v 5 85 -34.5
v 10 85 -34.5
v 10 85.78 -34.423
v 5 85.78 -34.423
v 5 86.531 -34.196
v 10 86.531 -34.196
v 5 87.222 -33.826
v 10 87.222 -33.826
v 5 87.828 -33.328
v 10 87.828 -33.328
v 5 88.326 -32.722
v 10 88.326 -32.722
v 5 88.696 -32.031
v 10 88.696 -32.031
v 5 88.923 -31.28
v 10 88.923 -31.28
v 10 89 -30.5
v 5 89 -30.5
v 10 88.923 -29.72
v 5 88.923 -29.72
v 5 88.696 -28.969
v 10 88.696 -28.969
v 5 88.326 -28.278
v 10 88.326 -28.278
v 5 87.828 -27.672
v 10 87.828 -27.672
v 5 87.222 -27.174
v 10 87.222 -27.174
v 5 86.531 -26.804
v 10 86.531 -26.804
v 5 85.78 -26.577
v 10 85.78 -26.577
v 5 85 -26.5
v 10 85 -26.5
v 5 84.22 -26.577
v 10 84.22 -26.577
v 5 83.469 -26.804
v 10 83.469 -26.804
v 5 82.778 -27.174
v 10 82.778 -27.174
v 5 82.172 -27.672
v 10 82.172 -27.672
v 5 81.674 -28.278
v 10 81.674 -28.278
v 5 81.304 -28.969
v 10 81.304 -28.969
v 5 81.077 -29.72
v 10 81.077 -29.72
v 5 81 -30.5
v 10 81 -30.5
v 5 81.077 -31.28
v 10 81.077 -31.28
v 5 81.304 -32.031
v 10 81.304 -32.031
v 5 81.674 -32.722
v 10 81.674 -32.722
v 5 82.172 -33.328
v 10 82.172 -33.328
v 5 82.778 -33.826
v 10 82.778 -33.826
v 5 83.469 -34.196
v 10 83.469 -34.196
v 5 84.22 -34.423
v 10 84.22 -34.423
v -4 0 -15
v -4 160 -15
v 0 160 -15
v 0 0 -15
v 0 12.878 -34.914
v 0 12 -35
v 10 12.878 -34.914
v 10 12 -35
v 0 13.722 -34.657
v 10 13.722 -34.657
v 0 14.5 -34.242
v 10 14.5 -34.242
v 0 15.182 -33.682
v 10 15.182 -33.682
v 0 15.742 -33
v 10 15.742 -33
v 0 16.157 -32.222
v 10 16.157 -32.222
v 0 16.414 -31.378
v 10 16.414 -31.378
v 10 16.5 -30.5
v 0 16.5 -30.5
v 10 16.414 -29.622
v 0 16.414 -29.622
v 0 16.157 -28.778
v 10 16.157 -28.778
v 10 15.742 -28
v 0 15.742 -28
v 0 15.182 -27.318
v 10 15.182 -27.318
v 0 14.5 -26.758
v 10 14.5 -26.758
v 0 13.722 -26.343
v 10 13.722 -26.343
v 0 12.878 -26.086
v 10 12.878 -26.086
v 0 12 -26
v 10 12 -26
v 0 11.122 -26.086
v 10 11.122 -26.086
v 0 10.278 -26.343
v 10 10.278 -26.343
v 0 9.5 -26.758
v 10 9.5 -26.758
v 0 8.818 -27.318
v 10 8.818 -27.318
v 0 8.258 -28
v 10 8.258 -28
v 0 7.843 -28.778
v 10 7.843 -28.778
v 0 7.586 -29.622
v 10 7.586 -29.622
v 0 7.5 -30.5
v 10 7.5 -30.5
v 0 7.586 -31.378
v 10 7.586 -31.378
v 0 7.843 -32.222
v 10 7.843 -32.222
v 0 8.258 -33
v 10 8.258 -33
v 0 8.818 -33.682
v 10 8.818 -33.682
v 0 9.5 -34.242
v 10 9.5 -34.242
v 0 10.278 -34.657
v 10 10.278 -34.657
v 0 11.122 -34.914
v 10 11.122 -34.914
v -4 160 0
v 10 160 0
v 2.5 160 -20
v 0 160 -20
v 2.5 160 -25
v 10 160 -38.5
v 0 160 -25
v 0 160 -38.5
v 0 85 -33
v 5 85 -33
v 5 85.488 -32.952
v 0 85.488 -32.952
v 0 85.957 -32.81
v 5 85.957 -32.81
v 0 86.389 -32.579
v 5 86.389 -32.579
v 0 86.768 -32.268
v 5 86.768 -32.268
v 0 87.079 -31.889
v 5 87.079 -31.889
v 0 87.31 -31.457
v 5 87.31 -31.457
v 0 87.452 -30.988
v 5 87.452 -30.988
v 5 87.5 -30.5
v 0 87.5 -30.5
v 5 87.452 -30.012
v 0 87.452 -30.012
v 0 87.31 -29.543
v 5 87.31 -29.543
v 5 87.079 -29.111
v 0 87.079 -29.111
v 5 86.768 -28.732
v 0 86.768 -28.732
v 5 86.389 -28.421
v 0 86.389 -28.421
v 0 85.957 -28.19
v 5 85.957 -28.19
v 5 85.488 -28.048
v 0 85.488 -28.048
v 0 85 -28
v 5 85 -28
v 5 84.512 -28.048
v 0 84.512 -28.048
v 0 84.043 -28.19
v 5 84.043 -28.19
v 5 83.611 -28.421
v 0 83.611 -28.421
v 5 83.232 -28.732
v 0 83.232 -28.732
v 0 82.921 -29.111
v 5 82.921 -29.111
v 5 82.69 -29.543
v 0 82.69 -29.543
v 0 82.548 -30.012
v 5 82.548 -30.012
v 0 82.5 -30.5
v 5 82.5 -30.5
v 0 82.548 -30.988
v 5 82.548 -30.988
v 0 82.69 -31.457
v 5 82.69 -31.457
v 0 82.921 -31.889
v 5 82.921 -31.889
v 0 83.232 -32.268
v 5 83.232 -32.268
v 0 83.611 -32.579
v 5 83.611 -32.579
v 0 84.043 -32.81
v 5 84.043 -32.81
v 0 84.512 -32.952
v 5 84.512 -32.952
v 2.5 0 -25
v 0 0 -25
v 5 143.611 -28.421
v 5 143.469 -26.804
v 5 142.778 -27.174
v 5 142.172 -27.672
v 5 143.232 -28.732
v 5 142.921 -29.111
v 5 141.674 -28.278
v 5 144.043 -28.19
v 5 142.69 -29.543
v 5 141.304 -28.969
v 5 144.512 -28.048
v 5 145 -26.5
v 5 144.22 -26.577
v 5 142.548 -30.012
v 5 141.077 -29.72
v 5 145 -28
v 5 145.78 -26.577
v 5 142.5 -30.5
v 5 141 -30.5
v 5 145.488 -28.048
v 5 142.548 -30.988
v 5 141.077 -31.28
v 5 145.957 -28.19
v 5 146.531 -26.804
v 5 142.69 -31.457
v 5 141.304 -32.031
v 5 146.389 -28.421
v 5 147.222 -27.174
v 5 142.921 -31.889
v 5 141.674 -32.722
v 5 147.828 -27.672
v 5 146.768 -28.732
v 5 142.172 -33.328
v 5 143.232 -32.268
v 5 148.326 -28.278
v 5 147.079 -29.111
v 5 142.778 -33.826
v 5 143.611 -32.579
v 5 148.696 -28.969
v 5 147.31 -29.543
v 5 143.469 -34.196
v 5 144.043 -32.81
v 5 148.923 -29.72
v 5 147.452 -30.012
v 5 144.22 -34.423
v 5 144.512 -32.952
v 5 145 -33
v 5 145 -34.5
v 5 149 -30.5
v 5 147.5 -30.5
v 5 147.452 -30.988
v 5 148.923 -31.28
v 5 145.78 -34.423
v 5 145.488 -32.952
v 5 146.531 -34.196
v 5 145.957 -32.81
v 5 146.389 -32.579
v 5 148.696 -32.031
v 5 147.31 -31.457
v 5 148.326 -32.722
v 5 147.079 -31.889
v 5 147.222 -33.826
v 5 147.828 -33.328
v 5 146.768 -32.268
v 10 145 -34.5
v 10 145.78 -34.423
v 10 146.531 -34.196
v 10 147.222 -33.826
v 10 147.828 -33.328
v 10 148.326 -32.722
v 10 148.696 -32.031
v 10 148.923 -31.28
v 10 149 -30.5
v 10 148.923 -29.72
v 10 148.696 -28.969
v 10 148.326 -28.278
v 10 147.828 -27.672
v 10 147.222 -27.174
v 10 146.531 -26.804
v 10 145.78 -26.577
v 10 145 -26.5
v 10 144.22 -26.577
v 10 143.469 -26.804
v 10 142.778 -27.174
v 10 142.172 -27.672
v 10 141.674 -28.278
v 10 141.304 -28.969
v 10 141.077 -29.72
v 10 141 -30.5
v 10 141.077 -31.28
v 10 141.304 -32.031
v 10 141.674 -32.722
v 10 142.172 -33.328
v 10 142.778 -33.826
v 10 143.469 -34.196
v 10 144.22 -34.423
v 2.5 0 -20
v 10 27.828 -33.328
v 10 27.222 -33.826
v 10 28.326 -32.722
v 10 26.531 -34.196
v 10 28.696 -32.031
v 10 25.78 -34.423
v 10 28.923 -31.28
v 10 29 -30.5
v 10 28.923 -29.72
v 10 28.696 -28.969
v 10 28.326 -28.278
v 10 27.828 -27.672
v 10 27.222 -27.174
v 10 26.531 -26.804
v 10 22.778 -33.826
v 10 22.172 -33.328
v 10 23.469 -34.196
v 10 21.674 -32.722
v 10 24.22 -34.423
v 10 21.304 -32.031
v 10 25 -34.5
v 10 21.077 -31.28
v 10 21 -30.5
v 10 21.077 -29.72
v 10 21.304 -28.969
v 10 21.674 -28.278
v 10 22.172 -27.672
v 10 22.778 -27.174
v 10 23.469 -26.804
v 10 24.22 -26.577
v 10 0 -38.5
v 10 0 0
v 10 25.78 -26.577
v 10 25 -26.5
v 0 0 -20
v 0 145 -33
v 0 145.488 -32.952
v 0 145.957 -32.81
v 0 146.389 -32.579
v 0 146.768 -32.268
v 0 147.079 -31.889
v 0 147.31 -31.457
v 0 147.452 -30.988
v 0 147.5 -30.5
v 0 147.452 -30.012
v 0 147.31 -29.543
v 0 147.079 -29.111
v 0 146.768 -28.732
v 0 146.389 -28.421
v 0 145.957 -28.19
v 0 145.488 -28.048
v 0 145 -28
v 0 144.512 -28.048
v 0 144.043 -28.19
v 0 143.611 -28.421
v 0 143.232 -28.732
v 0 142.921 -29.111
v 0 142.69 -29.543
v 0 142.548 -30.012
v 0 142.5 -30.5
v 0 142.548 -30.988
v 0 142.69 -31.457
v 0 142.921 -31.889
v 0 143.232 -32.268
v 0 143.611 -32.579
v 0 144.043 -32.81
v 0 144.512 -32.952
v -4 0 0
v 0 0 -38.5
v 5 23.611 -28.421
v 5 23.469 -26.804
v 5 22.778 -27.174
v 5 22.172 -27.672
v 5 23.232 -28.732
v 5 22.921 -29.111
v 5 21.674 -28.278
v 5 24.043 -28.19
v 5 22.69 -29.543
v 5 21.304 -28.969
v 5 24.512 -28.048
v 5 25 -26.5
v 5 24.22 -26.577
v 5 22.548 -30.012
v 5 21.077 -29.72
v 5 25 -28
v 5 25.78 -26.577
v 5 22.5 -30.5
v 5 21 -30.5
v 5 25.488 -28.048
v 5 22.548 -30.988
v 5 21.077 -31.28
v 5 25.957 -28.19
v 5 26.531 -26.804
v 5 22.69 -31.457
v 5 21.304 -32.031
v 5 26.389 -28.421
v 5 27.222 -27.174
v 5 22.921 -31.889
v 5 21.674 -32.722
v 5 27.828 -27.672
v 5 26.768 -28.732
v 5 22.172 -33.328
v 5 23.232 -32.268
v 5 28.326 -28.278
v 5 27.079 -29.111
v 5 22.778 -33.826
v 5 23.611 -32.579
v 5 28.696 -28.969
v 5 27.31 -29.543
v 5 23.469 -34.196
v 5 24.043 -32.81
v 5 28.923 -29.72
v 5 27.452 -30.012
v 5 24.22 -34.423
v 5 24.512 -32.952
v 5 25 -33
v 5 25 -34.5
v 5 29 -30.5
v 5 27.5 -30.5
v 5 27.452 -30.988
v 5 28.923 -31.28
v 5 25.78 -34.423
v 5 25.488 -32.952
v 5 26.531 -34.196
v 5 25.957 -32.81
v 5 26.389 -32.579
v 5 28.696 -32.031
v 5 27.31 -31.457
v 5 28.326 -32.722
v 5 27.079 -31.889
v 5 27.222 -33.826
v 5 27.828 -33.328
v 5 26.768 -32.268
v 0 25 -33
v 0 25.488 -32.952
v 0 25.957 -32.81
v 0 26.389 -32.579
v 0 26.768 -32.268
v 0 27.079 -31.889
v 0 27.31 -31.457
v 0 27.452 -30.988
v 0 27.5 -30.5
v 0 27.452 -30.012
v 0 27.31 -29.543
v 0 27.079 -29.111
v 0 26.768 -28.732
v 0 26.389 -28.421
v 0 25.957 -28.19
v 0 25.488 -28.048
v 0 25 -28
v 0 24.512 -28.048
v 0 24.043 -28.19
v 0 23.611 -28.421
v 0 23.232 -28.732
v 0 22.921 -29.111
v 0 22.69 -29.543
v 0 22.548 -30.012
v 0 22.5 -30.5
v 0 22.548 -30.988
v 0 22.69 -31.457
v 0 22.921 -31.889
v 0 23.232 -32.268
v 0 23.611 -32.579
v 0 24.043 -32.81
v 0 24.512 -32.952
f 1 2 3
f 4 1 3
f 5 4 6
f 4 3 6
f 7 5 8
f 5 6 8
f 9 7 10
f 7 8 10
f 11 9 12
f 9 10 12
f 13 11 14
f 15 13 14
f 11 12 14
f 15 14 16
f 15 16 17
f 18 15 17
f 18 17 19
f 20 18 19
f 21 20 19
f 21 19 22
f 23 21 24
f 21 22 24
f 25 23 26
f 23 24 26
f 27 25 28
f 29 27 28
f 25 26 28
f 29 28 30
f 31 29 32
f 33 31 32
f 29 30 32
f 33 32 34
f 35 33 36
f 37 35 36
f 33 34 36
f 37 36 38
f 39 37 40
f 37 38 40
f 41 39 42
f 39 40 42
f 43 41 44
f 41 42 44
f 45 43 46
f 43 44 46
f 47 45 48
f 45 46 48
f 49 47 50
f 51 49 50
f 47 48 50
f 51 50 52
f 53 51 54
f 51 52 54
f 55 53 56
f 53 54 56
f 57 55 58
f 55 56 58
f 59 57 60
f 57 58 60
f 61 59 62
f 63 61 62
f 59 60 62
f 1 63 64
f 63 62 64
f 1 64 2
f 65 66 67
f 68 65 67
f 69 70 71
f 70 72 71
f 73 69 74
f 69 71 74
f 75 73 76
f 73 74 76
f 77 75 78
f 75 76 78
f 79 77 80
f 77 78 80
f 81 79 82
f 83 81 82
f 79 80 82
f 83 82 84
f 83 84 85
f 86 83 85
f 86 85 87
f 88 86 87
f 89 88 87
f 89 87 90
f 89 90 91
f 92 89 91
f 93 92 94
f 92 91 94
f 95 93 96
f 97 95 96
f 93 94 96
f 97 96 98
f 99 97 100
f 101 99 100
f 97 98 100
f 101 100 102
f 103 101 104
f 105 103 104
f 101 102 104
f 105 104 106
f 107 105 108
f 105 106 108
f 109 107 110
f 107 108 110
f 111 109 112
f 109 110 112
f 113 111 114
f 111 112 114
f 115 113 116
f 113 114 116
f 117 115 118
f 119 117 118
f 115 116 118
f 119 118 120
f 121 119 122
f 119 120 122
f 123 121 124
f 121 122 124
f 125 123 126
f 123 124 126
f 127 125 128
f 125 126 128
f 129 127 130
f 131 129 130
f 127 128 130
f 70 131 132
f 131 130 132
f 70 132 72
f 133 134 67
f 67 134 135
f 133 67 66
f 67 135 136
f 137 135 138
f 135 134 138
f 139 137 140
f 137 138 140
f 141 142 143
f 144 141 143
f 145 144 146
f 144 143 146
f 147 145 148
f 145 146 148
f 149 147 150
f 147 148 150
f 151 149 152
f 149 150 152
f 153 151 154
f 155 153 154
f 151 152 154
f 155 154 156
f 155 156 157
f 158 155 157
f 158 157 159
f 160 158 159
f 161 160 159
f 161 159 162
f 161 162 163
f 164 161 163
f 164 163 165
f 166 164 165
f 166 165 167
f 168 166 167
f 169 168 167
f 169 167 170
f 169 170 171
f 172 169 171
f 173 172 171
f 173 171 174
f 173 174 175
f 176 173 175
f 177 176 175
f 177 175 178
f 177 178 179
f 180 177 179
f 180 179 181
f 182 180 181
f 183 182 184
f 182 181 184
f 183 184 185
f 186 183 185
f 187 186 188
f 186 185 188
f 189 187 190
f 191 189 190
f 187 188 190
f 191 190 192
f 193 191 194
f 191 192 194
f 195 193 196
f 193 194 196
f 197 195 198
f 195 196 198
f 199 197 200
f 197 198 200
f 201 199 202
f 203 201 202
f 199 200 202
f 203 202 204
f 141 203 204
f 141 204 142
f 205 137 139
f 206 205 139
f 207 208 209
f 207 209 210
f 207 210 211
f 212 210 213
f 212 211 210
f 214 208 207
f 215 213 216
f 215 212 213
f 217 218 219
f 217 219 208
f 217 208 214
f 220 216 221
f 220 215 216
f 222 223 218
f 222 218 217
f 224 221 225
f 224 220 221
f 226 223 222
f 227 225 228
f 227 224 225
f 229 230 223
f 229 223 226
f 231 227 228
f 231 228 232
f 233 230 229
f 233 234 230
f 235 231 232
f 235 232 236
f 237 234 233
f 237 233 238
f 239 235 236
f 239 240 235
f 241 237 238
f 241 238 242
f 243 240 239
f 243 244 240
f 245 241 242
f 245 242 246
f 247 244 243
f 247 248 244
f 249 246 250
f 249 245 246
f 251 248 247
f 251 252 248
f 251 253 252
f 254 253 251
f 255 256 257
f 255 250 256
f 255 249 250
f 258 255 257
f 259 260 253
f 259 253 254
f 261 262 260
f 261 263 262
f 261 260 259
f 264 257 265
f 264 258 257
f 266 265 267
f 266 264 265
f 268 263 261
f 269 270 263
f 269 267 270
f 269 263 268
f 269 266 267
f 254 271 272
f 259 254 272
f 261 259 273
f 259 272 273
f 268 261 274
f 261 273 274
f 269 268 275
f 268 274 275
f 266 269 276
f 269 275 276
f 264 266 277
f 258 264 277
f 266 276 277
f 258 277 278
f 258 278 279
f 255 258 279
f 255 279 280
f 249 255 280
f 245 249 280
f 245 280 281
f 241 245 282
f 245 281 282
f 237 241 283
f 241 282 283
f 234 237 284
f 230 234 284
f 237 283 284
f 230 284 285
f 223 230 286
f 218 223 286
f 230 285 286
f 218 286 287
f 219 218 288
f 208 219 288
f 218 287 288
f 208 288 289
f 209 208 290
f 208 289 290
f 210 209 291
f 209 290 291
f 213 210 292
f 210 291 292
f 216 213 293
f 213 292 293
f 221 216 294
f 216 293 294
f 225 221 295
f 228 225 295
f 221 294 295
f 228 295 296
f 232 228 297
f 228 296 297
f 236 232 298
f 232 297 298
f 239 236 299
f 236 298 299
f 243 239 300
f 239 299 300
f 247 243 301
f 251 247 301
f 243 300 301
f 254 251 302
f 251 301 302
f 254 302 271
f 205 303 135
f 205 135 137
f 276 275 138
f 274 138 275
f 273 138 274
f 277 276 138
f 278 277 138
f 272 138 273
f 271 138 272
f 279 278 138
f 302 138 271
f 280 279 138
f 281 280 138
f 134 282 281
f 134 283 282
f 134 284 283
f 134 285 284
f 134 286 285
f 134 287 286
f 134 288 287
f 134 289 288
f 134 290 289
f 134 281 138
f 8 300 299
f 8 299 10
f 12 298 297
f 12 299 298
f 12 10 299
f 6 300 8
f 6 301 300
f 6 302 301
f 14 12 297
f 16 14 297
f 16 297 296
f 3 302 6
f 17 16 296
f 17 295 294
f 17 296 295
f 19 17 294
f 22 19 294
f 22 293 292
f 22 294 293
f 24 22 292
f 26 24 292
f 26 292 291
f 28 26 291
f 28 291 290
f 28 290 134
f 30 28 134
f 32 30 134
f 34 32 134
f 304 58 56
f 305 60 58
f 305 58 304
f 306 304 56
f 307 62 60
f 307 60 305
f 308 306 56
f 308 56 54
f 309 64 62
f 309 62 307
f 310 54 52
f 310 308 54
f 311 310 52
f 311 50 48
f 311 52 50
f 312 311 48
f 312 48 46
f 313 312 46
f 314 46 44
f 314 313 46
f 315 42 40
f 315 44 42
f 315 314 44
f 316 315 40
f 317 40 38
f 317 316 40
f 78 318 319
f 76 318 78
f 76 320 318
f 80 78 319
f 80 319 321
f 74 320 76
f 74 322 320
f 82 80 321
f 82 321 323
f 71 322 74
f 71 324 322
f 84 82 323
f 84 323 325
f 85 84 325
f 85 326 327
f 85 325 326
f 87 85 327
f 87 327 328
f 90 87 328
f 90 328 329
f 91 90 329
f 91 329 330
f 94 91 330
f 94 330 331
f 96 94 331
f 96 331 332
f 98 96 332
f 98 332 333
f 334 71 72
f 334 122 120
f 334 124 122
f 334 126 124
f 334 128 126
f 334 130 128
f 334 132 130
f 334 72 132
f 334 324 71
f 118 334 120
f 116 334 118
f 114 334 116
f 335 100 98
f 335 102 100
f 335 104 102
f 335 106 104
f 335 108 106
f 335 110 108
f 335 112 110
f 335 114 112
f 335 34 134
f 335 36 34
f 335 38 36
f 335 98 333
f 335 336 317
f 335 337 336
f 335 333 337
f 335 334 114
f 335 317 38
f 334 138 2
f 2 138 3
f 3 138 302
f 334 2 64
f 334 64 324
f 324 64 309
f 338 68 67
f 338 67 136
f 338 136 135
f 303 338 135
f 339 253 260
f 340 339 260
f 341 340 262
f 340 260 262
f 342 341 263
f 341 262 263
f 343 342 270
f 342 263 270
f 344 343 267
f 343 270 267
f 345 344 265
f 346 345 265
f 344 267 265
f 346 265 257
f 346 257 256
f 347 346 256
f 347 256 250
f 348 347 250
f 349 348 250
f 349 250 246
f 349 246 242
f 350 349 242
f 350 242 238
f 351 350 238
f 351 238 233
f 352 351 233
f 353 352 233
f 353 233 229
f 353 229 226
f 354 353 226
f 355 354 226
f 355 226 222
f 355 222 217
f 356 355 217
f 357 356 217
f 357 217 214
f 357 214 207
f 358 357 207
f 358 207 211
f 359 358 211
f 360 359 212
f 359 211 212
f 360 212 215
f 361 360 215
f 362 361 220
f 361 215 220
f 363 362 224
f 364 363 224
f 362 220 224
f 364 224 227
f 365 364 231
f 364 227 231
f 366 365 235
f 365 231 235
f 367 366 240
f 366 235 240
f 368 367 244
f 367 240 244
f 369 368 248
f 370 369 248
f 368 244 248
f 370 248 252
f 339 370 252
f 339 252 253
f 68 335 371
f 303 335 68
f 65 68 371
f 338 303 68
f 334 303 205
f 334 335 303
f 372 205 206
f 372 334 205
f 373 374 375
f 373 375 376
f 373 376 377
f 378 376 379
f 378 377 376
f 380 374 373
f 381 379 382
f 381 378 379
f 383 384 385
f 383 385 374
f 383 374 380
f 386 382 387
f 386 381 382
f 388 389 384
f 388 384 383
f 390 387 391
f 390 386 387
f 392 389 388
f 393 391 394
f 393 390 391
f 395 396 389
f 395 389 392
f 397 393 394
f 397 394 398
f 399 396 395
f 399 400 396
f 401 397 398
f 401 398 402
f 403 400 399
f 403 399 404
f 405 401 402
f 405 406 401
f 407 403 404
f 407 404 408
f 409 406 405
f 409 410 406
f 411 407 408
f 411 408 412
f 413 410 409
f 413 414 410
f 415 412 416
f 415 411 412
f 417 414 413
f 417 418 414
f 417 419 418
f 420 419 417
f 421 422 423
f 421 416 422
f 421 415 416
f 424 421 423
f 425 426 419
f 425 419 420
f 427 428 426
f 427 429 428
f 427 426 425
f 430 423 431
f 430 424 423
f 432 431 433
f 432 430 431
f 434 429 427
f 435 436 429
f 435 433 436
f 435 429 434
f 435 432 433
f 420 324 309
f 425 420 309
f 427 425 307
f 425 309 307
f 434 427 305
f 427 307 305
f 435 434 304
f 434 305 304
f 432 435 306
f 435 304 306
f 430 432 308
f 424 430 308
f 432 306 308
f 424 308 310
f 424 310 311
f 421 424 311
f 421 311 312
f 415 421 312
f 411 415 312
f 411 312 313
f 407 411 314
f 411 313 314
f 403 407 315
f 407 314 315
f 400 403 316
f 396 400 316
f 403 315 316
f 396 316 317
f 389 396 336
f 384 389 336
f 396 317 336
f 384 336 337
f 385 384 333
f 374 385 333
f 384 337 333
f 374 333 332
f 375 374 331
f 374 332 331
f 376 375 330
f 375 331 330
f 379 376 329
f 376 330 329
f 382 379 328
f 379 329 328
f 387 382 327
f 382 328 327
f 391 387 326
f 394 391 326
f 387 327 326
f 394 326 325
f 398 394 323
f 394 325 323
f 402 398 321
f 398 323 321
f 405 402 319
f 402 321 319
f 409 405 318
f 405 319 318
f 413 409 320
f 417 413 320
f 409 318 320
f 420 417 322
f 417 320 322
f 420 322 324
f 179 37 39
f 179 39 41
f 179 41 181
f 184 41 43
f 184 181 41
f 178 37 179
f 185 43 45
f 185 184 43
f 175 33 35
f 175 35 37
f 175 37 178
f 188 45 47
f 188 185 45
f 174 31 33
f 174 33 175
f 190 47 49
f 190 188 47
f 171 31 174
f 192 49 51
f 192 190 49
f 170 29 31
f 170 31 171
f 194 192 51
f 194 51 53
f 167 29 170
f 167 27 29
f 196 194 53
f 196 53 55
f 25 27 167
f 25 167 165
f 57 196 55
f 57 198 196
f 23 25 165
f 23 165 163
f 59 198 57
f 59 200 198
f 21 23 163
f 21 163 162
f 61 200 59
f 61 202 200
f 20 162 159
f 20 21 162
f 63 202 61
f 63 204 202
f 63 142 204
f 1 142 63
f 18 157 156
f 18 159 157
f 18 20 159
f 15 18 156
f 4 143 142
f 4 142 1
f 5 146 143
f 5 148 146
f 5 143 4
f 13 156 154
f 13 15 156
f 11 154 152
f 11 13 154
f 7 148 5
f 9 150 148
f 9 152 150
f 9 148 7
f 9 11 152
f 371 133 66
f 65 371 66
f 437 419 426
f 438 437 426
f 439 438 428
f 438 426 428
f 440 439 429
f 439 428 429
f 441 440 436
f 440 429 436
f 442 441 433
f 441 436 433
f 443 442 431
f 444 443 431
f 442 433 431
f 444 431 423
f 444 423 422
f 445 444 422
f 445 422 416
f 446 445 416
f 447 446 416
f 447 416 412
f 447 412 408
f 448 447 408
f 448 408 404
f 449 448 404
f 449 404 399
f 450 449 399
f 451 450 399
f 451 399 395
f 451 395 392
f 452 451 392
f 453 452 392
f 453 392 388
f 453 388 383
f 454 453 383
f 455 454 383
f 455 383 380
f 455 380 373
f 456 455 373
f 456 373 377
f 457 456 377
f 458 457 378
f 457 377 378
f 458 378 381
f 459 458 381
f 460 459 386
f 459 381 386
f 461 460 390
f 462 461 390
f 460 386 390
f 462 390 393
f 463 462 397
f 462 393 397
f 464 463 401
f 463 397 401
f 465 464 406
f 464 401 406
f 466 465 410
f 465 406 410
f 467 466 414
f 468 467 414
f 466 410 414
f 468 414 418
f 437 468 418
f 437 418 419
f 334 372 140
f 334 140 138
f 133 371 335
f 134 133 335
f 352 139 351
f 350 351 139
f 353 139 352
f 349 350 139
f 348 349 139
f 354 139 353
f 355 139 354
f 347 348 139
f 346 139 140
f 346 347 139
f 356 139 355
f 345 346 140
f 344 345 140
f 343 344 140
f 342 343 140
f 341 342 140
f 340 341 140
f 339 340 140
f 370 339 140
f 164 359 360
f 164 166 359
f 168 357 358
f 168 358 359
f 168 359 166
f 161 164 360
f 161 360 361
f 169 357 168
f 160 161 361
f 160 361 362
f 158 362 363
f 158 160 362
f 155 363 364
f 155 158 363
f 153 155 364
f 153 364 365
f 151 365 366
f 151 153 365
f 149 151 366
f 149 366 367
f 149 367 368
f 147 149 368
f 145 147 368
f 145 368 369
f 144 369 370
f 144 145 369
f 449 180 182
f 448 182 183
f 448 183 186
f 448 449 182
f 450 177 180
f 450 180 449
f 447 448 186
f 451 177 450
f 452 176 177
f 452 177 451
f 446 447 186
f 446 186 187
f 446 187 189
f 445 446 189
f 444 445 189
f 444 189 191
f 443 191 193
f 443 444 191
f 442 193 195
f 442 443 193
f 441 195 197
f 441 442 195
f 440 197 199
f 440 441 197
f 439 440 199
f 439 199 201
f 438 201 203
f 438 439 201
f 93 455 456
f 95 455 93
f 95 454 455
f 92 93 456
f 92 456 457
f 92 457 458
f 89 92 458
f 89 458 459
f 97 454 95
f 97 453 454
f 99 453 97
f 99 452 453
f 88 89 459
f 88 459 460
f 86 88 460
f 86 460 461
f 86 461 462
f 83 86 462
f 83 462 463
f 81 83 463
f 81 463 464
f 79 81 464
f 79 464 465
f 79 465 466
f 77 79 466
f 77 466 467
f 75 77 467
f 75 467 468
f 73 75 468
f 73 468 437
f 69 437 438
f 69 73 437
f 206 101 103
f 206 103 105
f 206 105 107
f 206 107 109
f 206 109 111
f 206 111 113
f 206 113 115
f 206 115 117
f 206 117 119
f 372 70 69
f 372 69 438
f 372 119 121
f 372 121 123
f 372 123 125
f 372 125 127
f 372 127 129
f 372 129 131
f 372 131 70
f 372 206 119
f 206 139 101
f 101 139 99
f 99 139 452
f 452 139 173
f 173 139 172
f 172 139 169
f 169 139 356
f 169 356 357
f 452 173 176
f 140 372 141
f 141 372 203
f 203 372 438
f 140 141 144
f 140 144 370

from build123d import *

# Parameters (mm, degrees)
BOSS_EXTRUDE1_DEPTH = 160
SKETCH2_R           = 4
SKETCH2_R_2         = 4.5
CUT_EXTRUDE2_DEPTH  = 5
SKETCH3_R           = 2.5
SKETCH3_R_2         = 4.5
CUT_EXTRUDE3_DEPTH  = 10


with BuildPart() as part:
    # Sketch1 → Boss-Extrude1 (new body)
    with BuildSketch(Plane(origin=(0, 0, 0), x_dir=(1, 0, 0), z_dir=(0, 1, 0))):
        Polygon((0, 20), (2.5, 20), (2.5, 25), (0, 25), (0, 38.5), (10, 38.5), (10, 0), (0, 0), (-4, 0), (-4, 15), (0, 15), align=None)
    extrude(amount=BOSS_EXTRUDE1_DEPTH)

    # Sketch2 → Cut-Extrude2 (cut)
    with BuildSketch(Plane(origin=(10, 0, 0), x_dir=(0, 0, -1), z_dir=(1, 0, 0))):
        with Locations((30.5, 145)):
            Circle(SKETCH2_R)
        with Locations((30.5, 85)):
            Circle(SKETCH2_R)
        with Locations((30.5, 25)):
            Circle(SKETCH2_R)
        with Locations((30.5, 12)):
            Circle(SKETCH2_R_2)
    extrude(amount=-CUT_EXTRUDE2_DEPTH, mode=Mode.SUBTRACT)

    # Sketch3 → Cut-Extrude3 (cut, through all)
    with BuildSketch(Plane(origin=(5, 0, 0), x_dir=(0, 0, -1), z_dir=(1, 0, 0))):
        with Locations((30.5, 145)):
            Circle(SKETCH3_R)
        with Locations((30.5, 85)):
            Circle(SKETCH3_R)
        with Locations((30.5, 25)):
            Circle(SKETCH3_R)
        with Locations((30.5, 12)):
            Circle(SKETCH3_R_2)
    extrude(amount=-CUT_EXTRUDE3_DEPTH, mode=Mode.SUBTRACT)


solid = part.part
